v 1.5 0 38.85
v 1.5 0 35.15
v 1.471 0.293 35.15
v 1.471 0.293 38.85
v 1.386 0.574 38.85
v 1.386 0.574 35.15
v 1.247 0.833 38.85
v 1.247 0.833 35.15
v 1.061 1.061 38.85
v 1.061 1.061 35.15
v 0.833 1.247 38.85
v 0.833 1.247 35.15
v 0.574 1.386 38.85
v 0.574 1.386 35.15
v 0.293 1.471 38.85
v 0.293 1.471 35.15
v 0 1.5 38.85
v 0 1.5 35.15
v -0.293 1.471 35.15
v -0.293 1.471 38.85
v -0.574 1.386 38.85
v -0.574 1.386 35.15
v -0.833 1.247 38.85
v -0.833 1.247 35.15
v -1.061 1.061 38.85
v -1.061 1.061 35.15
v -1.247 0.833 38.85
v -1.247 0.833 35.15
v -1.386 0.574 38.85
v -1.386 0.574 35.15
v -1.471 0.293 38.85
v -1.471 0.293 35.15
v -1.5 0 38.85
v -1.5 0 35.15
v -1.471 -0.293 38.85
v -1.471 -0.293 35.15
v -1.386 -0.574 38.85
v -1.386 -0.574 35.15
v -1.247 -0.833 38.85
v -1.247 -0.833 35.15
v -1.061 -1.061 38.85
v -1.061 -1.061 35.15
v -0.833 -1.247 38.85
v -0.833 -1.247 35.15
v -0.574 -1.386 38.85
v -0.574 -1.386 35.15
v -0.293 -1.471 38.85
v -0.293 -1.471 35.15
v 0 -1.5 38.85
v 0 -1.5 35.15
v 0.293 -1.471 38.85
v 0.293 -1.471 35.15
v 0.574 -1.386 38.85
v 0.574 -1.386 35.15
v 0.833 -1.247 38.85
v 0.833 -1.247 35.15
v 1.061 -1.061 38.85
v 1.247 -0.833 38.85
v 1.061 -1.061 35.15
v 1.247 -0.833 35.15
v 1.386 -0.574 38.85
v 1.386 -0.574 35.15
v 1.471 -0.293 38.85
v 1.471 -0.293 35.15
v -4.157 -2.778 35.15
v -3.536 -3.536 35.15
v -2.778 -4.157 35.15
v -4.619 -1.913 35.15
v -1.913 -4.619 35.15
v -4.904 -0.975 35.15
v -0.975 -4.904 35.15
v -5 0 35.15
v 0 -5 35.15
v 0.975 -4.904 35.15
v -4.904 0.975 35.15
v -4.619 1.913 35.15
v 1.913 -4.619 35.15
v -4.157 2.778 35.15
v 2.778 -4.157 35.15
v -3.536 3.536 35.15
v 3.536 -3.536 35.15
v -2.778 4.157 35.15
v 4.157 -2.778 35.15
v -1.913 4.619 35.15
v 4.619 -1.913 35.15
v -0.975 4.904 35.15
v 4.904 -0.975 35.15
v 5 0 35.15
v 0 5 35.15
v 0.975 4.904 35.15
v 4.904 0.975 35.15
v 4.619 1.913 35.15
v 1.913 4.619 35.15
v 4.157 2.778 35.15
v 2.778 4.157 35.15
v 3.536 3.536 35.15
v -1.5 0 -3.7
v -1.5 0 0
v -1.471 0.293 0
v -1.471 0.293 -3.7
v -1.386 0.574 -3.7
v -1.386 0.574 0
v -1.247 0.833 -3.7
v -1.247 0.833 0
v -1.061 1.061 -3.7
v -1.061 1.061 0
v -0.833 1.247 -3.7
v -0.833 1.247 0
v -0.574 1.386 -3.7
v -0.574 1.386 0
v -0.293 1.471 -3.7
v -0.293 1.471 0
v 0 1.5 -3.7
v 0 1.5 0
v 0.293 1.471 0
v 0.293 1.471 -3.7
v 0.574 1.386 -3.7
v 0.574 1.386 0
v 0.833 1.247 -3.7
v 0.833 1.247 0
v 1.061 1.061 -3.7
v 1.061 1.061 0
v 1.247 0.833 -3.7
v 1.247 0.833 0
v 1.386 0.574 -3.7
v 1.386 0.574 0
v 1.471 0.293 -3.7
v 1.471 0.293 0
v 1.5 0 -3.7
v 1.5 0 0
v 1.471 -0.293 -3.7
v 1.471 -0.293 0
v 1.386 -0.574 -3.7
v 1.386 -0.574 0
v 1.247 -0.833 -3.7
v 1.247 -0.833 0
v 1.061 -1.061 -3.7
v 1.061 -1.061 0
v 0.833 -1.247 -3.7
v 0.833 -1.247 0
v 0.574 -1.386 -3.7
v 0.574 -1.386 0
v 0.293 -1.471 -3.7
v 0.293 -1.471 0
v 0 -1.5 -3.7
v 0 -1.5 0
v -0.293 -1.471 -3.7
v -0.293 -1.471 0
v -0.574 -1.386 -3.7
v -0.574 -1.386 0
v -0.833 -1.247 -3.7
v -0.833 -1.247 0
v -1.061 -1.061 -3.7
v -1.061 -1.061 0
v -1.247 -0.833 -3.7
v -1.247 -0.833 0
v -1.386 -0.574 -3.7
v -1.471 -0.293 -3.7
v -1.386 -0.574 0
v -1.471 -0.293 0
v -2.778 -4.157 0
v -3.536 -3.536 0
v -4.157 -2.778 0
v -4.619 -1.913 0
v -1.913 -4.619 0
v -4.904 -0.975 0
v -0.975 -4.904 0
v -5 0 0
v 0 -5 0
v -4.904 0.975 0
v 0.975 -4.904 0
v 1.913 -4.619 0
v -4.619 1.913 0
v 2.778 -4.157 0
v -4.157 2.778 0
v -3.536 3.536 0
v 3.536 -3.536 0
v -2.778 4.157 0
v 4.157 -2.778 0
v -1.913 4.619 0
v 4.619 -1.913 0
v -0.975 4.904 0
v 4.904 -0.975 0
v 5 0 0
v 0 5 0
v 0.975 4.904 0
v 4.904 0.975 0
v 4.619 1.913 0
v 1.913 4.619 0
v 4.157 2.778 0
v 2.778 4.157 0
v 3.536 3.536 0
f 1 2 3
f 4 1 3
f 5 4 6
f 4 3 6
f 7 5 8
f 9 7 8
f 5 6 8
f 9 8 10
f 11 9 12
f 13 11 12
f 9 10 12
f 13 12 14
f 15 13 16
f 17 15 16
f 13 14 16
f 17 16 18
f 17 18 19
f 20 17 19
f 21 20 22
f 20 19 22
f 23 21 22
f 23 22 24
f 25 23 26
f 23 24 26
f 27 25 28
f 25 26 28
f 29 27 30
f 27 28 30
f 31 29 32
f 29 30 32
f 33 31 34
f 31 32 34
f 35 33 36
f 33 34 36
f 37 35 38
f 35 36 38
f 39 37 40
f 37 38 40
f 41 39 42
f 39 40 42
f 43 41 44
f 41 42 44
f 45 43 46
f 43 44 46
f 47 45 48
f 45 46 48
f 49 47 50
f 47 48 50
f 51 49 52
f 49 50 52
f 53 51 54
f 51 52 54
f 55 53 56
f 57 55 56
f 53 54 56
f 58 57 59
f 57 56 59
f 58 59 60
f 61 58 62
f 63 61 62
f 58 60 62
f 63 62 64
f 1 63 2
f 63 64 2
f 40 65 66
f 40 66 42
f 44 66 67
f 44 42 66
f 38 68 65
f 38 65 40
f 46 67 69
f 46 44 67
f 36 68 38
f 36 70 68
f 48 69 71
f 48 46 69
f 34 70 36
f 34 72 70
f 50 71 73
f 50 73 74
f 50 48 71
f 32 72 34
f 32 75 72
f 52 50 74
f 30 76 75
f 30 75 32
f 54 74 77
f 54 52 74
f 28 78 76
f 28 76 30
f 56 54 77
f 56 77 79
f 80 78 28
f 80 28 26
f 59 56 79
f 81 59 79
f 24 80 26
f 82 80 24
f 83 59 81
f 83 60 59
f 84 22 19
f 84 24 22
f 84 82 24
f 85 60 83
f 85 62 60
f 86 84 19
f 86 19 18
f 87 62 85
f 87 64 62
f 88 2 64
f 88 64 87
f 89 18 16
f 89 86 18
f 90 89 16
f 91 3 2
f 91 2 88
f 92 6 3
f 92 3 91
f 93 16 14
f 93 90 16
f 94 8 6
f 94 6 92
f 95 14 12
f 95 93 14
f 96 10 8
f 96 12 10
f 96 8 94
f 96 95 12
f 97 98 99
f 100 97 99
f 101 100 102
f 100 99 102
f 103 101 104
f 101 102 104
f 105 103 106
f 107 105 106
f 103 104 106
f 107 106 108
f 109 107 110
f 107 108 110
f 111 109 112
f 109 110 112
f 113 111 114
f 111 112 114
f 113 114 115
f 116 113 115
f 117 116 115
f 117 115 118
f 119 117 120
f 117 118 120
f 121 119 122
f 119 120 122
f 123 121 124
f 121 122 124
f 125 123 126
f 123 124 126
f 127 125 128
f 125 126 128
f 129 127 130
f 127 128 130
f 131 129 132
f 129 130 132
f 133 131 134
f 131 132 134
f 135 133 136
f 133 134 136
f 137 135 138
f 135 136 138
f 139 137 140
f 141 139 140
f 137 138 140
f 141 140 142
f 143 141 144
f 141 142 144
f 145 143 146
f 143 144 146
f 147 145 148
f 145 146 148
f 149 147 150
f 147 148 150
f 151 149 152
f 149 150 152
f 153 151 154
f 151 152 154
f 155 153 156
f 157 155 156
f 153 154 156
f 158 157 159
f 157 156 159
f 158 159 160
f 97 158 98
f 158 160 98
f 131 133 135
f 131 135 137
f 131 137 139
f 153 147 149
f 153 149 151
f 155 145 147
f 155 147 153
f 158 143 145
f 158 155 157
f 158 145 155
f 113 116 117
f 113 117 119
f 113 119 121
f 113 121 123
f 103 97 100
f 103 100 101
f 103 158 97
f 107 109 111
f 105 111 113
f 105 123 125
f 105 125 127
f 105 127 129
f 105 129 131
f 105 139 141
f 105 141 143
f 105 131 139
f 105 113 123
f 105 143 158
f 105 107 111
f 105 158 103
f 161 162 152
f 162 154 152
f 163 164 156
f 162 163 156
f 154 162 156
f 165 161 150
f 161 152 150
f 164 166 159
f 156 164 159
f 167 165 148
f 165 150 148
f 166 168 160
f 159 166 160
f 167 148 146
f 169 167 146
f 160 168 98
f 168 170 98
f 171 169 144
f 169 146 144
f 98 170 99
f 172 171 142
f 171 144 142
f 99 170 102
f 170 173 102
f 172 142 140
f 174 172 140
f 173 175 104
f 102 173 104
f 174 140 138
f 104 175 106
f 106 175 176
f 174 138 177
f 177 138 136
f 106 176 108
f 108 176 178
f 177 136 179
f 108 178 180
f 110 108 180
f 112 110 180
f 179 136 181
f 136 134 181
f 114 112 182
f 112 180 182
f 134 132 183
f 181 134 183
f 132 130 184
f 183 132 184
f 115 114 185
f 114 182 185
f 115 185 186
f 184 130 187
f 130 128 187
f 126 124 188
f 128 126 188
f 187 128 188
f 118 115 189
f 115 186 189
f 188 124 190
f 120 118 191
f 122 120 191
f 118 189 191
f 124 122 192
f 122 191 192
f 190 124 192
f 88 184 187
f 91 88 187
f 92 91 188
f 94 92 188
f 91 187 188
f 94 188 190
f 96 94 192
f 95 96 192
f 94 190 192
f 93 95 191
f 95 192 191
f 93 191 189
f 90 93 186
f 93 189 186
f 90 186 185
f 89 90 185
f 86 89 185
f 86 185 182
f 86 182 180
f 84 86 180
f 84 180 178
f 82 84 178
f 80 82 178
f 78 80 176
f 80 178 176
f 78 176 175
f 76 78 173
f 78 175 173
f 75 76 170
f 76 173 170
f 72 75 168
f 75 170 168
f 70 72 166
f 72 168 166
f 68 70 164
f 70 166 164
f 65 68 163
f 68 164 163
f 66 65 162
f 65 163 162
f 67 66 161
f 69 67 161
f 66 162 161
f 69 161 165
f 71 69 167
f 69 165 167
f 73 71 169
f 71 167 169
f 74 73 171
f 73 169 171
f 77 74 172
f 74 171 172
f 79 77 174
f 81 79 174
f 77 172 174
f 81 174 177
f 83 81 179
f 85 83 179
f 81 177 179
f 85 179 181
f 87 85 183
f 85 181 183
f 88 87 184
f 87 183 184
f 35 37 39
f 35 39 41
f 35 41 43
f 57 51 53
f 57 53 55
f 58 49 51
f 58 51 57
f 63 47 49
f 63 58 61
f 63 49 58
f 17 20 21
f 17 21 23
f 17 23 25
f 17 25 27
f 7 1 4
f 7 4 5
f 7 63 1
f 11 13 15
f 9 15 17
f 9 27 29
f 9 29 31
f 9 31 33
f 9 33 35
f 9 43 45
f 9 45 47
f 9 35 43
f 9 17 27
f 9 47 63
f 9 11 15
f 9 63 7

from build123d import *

# Parameters (mm, degrees)
SKETCH_1_R      = 5
EXTRUDE_1_DEPTH = 35.15
SKETCH_2_R      = 1.5
EXTRUDE_2_DEPTH = 3.7
SKETCH_3_R      = 1.5
EXTRUDE_3_DEPTH = 3.7


with BuildPart() as part:
    # 草图1 → 凸台-拉伸1 (new body)
    with BuildSketch(Plane.XY):
        Circle(SKETCH_1_R)
    extrude(amount=EXTRUDE_1_DEPTH)

    # 草图2 → 凸台-拉伸2 (add)
    with BuildSketch(Plane(origin=(0, 0, 0), x_dir=(-1, 0, 0), z_dir=(0, 0, -1))):
        Circle(SKETCH_2_R)
    extrude(amount=EXTRUDE_2_DEPTH)

    # 草图3 → 凸台-拉伸3 (add)
    with BuildSketch(Plane.XY.offset(35.15)):
        Circle(SKETCH_3_R)
    extrude(amount=EXTRUDE_3_DEPTH)


solid = part.part
